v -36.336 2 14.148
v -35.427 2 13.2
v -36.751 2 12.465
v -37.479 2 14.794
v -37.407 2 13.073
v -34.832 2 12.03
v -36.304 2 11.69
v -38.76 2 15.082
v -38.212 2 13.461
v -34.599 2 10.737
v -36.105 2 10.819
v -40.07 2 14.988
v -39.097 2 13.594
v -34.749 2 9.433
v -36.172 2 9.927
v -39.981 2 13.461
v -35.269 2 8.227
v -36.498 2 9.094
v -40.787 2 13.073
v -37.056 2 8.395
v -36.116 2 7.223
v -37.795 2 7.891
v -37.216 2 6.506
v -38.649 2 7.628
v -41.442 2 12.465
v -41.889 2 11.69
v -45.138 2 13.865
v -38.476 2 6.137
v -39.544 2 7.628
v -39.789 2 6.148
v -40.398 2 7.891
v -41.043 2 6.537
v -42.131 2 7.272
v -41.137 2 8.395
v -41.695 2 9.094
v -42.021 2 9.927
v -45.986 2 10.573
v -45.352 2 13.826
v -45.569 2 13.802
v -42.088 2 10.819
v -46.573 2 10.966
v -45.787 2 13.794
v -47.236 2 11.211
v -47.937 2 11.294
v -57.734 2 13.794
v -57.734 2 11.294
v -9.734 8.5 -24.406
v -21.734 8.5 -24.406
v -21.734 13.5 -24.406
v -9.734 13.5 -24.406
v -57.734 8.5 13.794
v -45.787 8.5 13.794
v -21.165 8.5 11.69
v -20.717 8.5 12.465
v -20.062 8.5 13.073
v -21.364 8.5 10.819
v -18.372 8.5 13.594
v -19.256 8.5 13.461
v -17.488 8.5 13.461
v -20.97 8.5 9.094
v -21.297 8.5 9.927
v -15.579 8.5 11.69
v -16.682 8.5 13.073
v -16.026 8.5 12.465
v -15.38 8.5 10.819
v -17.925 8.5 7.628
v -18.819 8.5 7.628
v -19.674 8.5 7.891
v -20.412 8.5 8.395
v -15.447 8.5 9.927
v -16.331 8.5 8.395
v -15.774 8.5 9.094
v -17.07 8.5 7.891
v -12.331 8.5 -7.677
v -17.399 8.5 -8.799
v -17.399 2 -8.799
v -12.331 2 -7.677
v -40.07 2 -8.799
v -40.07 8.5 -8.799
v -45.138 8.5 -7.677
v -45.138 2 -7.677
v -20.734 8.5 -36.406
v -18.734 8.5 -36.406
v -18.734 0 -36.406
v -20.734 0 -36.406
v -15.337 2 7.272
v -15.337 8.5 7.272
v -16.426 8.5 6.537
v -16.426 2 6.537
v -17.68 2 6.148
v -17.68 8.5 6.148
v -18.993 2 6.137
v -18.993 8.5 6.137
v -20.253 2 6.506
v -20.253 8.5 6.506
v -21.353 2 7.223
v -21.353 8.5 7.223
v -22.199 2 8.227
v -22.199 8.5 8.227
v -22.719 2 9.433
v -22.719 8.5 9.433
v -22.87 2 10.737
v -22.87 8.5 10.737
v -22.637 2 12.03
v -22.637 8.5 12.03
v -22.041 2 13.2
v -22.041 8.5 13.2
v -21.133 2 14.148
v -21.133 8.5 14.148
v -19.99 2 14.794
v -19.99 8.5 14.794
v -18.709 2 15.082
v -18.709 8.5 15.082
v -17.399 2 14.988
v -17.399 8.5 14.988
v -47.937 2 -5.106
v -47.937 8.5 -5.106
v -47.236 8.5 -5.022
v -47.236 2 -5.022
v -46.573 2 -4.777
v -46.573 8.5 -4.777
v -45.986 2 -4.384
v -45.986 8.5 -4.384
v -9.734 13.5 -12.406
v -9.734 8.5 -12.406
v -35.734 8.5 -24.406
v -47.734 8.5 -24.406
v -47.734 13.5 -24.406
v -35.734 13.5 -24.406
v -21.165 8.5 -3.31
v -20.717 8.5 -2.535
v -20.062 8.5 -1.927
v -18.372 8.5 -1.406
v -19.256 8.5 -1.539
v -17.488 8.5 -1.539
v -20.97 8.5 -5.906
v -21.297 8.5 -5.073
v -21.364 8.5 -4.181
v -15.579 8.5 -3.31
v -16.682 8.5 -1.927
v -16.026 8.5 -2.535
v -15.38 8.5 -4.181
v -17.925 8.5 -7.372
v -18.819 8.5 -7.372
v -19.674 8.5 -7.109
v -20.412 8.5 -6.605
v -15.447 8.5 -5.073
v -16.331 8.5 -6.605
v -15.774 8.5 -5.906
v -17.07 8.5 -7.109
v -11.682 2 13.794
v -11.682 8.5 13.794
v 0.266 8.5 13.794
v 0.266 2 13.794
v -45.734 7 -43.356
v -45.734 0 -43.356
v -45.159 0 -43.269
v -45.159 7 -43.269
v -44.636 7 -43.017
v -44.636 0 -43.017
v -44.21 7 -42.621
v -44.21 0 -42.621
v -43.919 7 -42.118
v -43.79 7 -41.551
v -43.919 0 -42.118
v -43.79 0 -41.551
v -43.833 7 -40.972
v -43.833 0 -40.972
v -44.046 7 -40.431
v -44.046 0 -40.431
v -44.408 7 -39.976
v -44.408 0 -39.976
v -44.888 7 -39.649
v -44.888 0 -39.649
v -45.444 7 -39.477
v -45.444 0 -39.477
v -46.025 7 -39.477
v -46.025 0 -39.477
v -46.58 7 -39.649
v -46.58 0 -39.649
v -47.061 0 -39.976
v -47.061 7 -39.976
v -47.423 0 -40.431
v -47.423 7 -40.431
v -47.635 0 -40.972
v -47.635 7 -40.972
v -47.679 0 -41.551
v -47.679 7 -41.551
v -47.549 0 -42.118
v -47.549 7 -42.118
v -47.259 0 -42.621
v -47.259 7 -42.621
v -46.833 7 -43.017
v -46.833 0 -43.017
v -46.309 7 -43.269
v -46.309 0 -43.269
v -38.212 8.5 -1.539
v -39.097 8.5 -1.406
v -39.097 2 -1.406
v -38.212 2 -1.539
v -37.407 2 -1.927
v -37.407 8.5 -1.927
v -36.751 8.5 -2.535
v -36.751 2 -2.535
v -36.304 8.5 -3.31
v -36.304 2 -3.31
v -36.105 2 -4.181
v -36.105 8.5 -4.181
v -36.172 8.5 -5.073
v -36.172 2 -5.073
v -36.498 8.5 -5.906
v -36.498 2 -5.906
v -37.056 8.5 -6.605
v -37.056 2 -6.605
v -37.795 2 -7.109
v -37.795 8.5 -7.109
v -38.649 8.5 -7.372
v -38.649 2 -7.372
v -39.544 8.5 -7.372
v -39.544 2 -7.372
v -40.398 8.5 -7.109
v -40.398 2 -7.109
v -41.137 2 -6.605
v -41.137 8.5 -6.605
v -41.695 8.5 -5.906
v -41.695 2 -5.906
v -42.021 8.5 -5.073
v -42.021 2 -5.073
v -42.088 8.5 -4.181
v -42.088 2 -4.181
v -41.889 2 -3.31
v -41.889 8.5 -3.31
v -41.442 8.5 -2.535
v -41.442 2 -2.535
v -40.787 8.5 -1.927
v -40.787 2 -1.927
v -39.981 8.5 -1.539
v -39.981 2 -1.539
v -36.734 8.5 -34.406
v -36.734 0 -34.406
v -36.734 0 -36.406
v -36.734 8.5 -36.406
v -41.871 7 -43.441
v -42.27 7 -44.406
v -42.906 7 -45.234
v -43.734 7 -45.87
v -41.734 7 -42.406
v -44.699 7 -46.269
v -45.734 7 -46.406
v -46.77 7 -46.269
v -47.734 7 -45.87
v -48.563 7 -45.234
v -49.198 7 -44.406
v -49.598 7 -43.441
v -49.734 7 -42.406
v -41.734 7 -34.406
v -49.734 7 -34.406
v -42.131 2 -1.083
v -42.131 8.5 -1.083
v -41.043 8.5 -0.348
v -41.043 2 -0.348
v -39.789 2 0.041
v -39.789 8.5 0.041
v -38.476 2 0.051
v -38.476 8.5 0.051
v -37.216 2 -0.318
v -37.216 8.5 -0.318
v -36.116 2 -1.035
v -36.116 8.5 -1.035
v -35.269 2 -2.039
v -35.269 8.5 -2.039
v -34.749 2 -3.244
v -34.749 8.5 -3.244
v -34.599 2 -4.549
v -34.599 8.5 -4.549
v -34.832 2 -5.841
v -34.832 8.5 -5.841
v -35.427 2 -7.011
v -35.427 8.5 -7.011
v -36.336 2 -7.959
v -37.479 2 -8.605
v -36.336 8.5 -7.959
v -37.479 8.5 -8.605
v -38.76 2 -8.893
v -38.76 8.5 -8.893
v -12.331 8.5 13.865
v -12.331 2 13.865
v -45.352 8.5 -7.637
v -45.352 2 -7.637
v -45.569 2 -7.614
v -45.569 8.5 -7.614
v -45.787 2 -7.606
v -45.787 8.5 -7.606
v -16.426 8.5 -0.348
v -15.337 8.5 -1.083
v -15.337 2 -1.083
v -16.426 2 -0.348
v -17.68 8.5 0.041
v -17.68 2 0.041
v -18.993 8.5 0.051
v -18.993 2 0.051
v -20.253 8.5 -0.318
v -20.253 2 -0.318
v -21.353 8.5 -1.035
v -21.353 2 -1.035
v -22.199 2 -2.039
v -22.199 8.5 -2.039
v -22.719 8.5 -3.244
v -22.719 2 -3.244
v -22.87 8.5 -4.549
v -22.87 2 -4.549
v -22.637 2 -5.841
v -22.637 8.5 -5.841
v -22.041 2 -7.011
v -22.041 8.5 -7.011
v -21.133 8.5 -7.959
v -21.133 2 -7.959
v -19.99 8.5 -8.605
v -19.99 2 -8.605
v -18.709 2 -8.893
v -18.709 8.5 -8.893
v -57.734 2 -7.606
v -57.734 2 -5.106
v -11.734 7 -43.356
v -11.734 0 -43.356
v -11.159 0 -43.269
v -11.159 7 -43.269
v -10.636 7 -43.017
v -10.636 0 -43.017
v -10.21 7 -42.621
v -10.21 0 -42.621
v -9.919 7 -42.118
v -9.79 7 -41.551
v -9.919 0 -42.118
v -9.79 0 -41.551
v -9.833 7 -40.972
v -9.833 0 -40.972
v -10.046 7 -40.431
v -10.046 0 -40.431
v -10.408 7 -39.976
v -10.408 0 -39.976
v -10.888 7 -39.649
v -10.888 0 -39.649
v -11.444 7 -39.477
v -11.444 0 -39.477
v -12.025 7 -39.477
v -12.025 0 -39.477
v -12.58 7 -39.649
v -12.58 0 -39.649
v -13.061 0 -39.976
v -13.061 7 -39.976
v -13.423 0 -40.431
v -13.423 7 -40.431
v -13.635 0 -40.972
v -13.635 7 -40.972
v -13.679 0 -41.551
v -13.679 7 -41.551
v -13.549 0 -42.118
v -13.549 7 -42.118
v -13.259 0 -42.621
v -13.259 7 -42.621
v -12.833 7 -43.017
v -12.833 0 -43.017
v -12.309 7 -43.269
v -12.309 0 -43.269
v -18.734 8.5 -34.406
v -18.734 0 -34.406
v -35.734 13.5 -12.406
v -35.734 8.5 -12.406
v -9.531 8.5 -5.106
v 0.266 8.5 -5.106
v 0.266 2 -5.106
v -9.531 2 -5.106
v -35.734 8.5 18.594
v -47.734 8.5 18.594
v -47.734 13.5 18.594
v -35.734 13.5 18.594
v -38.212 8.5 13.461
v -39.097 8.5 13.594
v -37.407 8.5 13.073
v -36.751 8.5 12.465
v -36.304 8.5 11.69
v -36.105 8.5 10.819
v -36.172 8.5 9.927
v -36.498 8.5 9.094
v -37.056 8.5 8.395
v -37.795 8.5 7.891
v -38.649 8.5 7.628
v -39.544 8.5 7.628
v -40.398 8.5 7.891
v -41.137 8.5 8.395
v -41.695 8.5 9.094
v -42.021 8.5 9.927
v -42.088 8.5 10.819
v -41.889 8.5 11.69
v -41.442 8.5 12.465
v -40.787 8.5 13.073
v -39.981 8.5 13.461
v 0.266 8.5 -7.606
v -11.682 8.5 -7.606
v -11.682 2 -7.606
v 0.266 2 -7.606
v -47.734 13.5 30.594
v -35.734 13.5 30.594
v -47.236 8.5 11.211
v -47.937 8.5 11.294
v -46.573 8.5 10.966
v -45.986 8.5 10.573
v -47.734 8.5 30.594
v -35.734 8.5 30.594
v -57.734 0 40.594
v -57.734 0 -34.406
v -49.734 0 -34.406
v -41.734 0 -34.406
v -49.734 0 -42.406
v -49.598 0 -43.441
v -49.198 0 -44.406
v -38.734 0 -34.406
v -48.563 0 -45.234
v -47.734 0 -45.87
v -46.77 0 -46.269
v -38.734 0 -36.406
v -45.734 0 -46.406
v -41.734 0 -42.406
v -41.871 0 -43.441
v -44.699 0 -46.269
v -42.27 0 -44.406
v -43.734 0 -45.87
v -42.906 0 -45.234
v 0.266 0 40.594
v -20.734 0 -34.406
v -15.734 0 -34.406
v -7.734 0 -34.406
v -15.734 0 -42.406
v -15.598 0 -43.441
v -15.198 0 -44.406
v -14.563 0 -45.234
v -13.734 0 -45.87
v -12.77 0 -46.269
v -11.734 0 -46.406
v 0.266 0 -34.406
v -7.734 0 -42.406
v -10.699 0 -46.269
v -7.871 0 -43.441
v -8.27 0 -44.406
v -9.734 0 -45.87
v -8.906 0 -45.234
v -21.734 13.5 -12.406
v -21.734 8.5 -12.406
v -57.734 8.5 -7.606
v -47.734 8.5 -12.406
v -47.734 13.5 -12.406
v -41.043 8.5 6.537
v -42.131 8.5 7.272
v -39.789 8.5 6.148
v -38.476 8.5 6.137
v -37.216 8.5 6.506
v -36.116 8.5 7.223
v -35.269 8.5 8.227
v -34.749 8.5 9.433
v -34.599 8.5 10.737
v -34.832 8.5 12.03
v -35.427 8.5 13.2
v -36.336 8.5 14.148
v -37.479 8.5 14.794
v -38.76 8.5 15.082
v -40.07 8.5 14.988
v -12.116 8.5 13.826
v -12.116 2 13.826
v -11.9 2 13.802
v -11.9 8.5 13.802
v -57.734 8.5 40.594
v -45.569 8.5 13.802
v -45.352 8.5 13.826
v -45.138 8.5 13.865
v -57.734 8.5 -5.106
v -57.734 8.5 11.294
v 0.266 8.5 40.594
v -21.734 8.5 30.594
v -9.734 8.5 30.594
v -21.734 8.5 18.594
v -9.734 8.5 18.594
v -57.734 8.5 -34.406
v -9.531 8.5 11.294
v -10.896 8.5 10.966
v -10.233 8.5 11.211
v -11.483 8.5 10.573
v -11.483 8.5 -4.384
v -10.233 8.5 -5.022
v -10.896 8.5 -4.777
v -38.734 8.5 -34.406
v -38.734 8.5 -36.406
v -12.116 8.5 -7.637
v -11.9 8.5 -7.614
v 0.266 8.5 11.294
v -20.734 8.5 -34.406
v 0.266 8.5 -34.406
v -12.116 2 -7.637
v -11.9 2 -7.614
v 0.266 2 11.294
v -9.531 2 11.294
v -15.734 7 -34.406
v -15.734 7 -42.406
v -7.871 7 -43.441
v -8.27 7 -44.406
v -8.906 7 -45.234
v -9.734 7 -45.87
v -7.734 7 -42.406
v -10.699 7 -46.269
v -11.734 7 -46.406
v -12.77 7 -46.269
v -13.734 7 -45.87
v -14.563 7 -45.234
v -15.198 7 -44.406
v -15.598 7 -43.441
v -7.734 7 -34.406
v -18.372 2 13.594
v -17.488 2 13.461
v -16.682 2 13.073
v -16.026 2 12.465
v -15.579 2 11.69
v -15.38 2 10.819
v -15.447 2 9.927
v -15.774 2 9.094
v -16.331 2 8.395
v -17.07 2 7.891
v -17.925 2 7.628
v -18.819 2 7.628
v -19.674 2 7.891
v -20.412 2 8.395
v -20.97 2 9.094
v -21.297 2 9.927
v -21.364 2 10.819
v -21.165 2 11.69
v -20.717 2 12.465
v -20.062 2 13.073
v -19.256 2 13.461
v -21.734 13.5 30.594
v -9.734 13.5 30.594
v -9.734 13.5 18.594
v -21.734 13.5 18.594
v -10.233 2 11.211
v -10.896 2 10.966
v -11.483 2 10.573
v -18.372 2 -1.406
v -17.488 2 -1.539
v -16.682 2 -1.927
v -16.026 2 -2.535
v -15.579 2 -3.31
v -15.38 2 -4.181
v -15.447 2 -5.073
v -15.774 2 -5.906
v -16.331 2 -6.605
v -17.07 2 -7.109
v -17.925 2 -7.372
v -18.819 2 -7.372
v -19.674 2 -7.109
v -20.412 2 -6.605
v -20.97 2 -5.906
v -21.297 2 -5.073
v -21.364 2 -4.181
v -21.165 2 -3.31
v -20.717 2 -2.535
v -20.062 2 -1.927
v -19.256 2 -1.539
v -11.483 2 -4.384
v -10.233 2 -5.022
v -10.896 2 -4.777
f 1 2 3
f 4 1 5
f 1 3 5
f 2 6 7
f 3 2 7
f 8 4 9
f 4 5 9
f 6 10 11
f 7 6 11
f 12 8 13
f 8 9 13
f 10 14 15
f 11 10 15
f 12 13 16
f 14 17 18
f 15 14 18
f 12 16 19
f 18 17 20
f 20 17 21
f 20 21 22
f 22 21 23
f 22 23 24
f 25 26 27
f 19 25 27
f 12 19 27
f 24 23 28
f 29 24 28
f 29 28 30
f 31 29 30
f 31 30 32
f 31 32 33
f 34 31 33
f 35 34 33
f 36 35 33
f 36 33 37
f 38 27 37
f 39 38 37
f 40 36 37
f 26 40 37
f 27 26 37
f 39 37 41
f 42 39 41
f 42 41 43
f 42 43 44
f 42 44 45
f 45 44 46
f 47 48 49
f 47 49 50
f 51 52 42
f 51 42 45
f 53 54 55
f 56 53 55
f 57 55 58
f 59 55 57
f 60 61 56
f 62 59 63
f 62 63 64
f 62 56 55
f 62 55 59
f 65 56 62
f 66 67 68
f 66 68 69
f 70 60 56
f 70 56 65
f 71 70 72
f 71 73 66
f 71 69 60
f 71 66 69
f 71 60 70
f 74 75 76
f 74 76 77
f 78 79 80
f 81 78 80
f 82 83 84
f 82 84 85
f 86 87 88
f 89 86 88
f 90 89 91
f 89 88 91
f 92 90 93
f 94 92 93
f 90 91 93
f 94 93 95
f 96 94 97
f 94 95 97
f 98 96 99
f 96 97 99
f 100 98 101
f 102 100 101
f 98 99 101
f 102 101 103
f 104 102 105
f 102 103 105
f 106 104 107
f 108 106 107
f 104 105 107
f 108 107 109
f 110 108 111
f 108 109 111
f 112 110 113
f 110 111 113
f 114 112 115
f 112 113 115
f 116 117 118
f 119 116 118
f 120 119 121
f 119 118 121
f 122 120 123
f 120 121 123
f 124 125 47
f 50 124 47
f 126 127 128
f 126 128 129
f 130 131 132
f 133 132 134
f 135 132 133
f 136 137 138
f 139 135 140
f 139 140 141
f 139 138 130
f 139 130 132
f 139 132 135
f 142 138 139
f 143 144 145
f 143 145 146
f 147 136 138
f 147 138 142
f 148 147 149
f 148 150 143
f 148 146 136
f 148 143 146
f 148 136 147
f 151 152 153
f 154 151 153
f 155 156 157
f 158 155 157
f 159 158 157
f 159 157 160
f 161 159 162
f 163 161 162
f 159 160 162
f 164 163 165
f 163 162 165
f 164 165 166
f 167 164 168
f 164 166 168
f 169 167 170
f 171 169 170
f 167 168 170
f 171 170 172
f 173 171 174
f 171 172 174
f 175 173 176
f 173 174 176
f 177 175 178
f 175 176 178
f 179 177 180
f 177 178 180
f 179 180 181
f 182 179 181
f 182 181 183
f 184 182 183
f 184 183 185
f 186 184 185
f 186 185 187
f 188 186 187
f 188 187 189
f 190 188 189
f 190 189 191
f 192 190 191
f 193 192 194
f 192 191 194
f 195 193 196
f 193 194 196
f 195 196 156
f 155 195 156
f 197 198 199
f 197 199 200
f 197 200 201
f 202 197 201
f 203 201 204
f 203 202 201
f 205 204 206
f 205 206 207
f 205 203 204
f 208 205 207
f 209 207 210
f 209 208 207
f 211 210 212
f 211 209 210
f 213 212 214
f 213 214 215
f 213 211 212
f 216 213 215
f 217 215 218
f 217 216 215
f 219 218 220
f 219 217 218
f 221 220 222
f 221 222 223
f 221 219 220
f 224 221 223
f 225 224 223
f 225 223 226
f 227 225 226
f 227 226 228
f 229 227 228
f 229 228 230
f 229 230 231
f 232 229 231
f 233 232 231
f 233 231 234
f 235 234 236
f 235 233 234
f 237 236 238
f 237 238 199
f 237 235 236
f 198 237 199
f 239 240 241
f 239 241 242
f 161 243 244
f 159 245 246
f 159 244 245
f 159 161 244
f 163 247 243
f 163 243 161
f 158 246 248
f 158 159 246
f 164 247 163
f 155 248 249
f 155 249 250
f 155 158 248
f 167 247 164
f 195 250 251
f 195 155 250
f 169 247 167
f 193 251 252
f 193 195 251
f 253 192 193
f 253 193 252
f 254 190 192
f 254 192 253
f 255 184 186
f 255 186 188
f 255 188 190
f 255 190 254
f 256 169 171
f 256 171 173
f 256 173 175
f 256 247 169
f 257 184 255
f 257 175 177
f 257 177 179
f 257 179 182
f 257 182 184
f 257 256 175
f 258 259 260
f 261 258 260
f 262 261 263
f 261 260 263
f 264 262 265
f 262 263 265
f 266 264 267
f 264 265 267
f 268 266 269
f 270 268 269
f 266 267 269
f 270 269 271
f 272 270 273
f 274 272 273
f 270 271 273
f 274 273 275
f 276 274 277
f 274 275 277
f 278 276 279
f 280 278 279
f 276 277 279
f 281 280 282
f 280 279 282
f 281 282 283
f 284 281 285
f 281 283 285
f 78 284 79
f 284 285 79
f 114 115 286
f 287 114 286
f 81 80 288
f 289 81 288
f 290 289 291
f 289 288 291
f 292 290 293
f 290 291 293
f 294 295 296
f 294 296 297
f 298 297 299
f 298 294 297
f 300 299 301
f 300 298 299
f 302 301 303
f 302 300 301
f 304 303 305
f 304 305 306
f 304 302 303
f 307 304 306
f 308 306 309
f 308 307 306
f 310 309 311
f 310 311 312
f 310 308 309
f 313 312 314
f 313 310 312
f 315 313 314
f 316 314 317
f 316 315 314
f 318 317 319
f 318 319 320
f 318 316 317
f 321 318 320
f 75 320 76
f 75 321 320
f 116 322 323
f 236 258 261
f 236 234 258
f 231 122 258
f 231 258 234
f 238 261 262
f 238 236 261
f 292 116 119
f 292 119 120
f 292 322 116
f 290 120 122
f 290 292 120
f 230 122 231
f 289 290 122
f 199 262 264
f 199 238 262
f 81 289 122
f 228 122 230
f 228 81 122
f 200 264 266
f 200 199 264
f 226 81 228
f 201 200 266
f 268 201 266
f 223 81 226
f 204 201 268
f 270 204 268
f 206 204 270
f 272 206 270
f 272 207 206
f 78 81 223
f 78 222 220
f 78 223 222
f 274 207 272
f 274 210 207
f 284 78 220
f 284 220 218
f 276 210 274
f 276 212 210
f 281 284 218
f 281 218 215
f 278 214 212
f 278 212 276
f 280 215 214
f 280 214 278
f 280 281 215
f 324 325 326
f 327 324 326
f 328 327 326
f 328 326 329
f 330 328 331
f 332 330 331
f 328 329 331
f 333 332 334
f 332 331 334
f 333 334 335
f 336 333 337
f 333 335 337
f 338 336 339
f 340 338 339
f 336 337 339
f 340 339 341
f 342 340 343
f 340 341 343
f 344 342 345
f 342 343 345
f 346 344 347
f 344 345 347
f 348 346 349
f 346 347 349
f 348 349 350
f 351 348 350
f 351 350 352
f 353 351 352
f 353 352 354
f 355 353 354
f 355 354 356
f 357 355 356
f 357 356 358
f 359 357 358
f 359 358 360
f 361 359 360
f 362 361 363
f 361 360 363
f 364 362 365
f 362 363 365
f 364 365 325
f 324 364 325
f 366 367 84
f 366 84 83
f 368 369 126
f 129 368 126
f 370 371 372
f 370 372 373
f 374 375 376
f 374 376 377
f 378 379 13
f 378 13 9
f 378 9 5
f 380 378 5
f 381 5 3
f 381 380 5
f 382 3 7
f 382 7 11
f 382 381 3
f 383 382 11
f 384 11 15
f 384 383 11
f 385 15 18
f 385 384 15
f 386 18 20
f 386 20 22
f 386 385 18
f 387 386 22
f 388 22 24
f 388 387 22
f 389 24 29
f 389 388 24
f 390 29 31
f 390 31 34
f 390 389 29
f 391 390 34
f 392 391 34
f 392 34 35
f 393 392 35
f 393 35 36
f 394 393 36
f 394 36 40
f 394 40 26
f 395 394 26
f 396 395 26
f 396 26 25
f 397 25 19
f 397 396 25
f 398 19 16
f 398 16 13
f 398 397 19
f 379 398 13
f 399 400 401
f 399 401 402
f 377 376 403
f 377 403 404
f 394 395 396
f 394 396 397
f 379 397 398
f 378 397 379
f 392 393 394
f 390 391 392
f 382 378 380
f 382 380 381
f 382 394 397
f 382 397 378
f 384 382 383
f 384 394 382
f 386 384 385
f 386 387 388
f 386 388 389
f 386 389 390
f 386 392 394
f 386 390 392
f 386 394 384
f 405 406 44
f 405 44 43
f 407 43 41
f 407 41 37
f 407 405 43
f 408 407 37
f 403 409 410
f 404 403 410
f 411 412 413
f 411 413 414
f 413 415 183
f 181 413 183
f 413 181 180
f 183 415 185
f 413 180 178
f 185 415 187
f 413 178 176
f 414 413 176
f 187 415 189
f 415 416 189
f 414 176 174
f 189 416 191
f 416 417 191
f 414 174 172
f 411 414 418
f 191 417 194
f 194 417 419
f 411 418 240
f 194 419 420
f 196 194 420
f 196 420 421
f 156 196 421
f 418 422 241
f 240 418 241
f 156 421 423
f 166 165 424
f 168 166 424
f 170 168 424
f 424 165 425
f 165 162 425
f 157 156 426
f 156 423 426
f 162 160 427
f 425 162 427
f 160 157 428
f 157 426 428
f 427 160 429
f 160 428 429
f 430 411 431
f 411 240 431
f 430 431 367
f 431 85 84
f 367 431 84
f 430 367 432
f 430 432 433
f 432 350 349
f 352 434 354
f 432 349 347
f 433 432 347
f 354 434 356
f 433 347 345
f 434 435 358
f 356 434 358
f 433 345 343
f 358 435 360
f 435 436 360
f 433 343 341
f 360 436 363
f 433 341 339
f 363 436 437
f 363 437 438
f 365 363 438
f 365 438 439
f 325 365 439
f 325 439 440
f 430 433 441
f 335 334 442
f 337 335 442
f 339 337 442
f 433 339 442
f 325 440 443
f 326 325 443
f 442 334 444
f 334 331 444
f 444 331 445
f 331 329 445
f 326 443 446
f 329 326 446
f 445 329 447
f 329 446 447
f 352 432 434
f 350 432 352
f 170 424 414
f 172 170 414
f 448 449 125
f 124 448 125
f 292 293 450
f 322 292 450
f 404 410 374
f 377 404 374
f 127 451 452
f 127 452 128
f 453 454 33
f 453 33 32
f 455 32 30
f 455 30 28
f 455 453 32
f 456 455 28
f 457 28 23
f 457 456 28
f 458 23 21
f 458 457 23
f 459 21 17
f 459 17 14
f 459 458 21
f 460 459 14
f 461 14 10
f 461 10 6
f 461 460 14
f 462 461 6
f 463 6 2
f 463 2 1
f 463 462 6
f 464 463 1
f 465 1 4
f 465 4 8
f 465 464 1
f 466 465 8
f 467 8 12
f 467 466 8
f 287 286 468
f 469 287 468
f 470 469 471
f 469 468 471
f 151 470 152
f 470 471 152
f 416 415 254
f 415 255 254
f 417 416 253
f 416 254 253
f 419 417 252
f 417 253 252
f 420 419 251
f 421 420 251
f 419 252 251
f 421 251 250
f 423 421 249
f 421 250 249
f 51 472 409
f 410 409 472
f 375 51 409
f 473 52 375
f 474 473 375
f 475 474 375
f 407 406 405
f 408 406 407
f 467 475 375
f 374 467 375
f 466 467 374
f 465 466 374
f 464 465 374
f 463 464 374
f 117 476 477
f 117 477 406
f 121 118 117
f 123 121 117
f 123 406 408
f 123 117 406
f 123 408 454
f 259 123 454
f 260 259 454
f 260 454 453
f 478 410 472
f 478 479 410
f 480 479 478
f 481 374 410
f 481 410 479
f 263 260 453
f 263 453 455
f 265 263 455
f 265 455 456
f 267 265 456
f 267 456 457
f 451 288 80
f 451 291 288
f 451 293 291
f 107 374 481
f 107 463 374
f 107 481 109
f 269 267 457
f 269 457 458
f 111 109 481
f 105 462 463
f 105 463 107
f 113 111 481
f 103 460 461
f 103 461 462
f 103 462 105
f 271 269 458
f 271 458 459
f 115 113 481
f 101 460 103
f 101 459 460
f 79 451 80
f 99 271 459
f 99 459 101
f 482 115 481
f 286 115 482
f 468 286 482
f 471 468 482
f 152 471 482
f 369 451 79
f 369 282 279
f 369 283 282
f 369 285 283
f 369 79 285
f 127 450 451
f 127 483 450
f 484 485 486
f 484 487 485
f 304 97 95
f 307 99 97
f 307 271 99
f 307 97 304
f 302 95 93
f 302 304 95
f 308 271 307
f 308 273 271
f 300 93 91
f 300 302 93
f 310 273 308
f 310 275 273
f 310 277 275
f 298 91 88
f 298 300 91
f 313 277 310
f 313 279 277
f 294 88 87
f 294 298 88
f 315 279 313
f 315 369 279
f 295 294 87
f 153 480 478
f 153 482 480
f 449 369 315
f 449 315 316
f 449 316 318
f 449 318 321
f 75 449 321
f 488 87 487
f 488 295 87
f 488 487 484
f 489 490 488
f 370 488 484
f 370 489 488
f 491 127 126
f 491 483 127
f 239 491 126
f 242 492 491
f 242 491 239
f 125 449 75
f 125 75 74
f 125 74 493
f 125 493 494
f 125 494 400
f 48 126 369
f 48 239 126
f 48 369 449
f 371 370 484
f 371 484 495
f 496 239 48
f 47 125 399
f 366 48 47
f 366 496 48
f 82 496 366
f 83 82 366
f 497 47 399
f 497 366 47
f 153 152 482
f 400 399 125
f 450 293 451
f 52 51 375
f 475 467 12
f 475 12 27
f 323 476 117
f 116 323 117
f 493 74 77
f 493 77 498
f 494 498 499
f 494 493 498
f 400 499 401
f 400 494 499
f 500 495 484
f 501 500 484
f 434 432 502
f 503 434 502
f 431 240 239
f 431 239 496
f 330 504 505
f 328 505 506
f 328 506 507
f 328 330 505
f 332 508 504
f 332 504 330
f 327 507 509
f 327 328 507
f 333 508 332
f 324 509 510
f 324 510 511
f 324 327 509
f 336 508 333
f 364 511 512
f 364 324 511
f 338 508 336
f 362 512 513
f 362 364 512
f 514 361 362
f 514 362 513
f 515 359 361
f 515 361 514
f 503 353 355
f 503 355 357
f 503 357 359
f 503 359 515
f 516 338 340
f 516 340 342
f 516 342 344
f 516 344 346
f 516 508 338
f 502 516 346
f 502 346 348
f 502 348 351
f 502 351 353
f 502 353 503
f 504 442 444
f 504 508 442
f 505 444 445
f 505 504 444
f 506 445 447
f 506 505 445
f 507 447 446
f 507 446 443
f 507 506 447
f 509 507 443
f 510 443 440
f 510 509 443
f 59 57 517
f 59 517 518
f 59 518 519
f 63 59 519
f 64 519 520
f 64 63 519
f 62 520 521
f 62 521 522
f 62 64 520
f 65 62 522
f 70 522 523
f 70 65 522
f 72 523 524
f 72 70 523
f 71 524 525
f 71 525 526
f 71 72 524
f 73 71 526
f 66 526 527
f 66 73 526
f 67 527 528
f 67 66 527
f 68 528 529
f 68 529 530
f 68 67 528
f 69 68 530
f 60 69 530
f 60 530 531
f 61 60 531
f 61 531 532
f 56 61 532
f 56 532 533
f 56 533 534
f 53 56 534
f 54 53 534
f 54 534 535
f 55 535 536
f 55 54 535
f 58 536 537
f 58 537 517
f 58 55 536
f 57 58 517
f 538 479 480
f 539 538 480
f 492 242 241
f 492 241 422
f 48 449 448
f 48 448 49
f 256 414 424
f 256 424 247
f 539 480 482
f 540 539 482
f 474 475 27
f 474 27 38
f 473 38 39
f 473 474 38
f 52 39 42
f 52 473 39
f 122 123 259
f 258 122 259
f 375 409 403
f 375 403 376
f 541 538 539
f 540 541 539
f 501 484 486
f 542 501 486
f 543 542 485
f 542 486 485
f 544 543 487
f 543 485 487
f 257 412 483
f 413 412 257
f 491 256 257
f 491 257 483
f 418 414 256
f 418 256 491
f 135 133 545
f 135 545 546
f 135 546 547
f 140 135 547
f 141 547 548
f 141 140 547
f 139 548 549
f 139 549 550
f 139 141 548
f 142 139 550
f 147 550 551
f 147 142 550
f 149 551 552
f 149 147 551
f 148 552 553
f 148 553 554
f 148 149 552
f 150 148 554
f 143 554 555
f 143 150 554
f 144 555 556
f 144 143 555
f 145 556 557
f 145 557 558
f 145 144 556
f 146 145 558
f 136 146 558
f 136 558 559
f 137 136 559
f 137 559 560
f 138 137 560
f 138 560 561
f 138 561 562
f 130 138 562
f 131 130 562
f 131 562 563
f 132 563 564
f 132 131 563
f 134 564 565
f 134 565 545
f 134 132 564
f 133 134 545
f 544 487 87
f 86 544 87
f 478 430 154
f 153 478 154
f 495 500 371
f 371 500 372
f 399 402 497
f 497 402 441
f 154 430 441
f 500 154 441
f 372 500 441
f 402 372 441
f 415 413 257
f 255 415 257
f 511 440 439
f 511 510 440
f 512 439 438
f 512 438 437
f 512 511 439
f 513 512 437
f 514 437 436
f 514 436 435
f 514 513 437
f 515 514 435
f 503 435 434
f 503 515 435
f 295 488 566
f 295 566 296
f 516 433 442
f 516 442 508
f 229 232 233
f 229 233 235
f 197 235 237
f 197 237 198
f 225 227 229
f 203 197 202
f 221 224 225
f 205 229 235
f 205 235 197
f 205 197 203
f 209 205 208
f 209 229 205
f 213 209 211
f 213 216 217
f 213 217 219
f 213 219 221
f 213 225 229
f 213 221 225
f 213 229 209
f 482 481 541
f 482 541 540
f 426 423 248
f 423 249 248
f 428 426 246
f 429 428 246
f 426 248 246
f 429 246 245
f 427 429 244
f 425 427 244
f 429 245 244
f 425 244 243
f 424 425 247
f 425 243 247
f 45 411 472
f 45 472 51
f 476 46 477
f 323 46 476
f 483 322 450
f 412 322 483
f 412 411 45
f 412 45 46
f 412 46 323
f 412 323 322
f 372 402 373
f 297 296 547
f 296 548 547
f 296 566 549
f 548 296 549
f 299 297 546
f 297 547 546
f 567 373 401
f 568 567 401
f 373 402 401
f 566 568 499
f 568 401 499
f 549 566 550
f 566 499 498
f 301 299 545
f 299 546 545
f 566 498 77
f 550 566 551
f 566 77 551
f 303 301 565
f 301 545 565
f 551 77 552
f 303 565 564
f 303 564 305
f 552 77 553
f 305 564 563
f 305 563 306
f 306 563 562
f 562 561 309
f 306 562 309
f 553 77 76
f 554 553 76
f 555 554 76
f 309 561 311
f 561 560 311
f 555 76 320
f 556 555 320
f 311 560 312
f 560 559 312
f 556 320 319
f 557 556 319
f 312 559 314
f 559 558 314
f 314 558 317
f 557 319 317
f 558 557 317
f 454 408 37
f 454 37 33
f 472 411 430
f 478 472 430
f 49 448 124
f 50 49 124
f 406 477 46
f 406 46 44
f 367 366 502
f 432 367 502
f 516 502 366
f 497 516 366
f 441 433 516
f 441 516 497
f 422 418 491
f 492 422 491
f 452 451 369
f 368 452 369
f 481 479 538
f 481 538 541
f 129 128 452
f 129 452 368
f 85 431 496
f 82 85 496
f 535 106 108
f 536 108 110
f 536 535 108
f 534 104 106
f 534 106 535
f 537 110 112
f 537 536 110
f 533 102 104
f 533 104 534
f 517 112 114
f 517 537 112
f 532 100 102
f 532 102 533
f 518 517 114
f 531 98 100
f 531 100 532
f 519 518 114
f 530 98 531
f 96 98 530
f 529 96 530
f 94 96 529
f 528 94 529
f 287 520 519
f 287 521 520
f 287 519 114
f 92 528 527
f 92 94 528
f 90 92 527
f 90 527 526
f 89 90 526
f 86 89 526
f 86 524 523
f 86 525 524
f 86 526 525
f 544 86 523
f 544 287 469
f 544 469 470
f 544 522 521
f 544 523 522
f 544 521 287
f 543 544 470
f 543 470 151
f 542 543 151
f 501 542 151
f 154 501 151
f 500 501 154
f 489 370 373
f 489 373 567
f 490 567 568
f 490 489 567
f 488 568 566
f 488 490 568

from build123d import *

# Parameters (mm, degrees)
SKETCH1_W           = 58
SKETCH1_H           = 75
BOSS_EXTRUDE1_DEPTH = 8.5
SKETCH4_R           = 3
CUT_EXTRUDE1_DEPTH  = 6.5
SKETCH5_W           = 12
SKETCH5_H           = 12
BOSS_EXTRUDE2_DEPTH = 5
SKETCH8_W           = 2
SKETCH8_H           = 8.5
BOSS_EXTRUDE3_DEPTH = 2
SKETCH7_W           = 8
SKETCH7_H           = 7
BOSS_EXTRUDE4_DEPTH = 12
SKETCH9_R           = 1.95
CUT_EXTRUDE2_DEPTH  = 7
FILLET1_R           = 4


with BuildPart() as part:
    # Sketch1 → Boss-Extrude1 (new body)
    with BuildSketch(Plane(origin=(0, 0, 0), x_dir=(1, 0, 0), z_dir=(0, 1, 0))):
        with Locations((-28.734265734, -3.094405594)):
            Rectangle(SKETCH1_W, SKETCH1_H)
    extrude(amount=BOSS_EXTRUDE1_DEPTH)

    # Sketch4 → Cut-Extrude1 (cut)
    # profile 1 of 4: a face of its own
    with BuildSketch(Plane(origin=(0, 8.5, 0), x_dir=(1, 0, 0), z_dir=(0, 1, 0))):
        with BuildLine():
            Line((-57.734265734, 7.605594406), (-57.734265734, 5.105594406))
            Line((-57.734265734, 5.105594406), (-47.937319909, 5.105594406))
            ThreePointArc((-47.937319909, 5.105594406), (-46.897035131, 4.919454313), (-45.985842823, 4.384132793))
            Line((-45.985842823, 4.384132793), (-42.13114507, 1.082738189))
            ThreePointArc((-42.13114507, 1.082738189), (-34.749045592, 3.244128144), (-40.069670138, 8.799121725))
            Line((-40.069670138, 8.799121725), (-45.137956932, 7.676576192))
            ThreePointArc((-45.137956932, 7.676576192), (-45.46038672, 7.623392649), (-45.786688237, 7.605594406))
            Line((-45.786688237, 7.605594406), (-57.734265734, 7.605594406))
        make_face()
        with Locations(Location((-39.096573179, 4.405594406, 0), (0, 0, 270))):
            Circle(SKETCH4_R, mode=Mode.SUBTRACT)
    # profile 2 of 4: a face of its own
    with BuildSketch(Plane(origin=(0, 8.5, 0), x_dir=(1, 0, 0), z_dir=(0, 1, 0))):
        with BuildLine():
            Line((-57.734265734, -13.794405594), (-57.734265734, -11.294405594))
            Line((-57.734265734, -11.294405594), (-47.937319909, -11.294405594))
            ThreePointArc((-47.937319909, -11.294405594), (-46.897035131, -11.108265502), (-45.985842823, -10.572943982))
            Line((-45.985842823, -10.572943982), (-42.13114507, -7.271549377))
            ThreePointArc((-42.13114507, -7.271549377), (-34.749045592, -9.432939333), (-40.069670138, -14.987932914))
            Line((-40.069670138, -14.987932914), (-45.137956932, -13.865387381))
            ThreePointArc((-45.137956932, -13.865387381), (-45.46038672, -13.812203837), (-45.786688237, -13.794405594))
            Line((-45.786688237, -13.794405594), (-57.734265734, -13.794405594))
        make_face()
        with Locations(Location((-39.096573179, -10.594405594, 0), (0, 0, 270))):
            Circle(SKETCH4_R, mode=Mode.SUBTRACT)
    # profile 3 of 4: a face of its own
    with BuildSketch(Plane(origin=(0, 8.5, 0), x_dir=(1, 0, 0), z_dir=(0, 1, 0))):
        with BuildLine():
            Line((0.265734266, -13.794405594), (0.265734266, -11.294405594))
            Line((0.265734266, -11.294405594), (-9.531211559, -11.294405594))
            ThreePointArc((-9.531211559, -11.294405594), (-10.571496337, -11.108265502), (-11.482688645, -10.572943982))
            Line((-11.482688645, -10.572943982), (-15.337386398, -7.271549377))
            ThreePointArc((-15.337386398, -7.271549377), (-22.719485877, -9.432939333), (-17.39886133, -14.987932914))
            Line((-17.39886133, -14.987932914), (-12.330574537, -13.865387381))
            ThreePointArc((-12.330574537, -13.865387381), (-12.008144749, -13.812203837), (-11.681843231, -13.794405594))
            Line((-11.681843231, -13.794405594), (0.265734266, -13.794405594))
        make_face()
        with Locations(Location((-18.371958289, -10.594405594, 0), (0, 0, 270))):
            Circle(SKETCH4_R, mode=Mode.SUBTRACT)
    # profile 4 of 4: a face of its own
    with BuildSketch(Plane(origin=(0, 8.5, 0), x_dir=(1, 0, 0), z_dir=(0, 1, 0))):
        with BuildLine():
            Line((0.265734266, 7.605594406), (0.265734266, 5.105594406))
            Line((0.265734266, 5.105594406), (-9.531211559, 5.105594406))
            ThreePointArc((-9.531211559, 5.105594406), (-10.571496337, 4.919454313), (-11.482688645, 4.384132793))
            Line((-11.482688645, 4.384132793), (-15.337386398, 1.082738189))
            ThreePointArc((-15.337386398, 1.082738189), (-22.719485877, 3.244128144), (-17.39886133, 8.799121725))
            Line((-17.39886133, 8.799121725), (-12.330574537, 7.676576192))
            ThreePointArc((-12.330574537, 7.676576192), (-12.008144749, 7.623392649), (-11.681843231, 7.605594406))
            Line((-11.681843231, 7.605594406), (0.265734266, 7.605594406))
        make_face()
        with Locations(Location((-18.371958289, 4.405594406, 0), (0, 0, 270))):
            Circle(SKETCH4_R, mode=Mode.SUBTRACT)
    extrude(amount=-CUT_EXTRUDE1_DEPTH, mode=Mode.SUBTRACT)

    # Sketch5 → Boss-Extrude2 (add)
    with BuildSketch(Plane(origin=(0, 8.5, 0), x_dir=(1, 0, 0), z_dir=(0, 1, 0))):
        with Locations((-41.734265734, 18.405594406)):
            Rectangle(SKETCH5_W, SKETCH5_H)
        with Locations((-15.734265734, 18.405594406)):
            Rectangle(SKETCH5_W, SKETCH5_H)
        with Locations((-15.734265734, -24.594405594)):
            Rectangle(SKETCH5_W, SKETCH5_H)
        with Locations((-41.734265734, -24.594405594)):
            Rectangle(SKETCH5_W, SKETCH5_H)
    extrude(amount=BOSS_EXTRUDE2_DEPTH)

    # Sketch8 → Boss-Extrude3 (add)
    with BuildSketch(Plane(origin=(0, 0, -34.405594406), x_dir=(-1, 0, 0), z_dir=(0, 0, -1))):
        with Locations((37.734265734, 4.25)):
            Rectangle(SKETCH8_W, SKETCH8_H)
        with Locations((19.734265734, 4.25)):
            Rectangle(SKETCH8_W, SKETCH8_H)
    extrude(amount=BOSS_EXTRUDE3_DEPTH)

    # Sketch7 → Boss-Extrude4 (add)
    with BuildSketch(Plane(origin=(0, 0, -34.405594406), x_dir=(-1, 0, 0), z_dir=(0, 0, -1))):
        with Locations((45.734265734, 3.5)):
            Rectangle(SKETCH7_W, SKETCH7_H)
        with Locations((11.734265734, 3.5)):
            Rectangle(SKETCH7_W, SKETCH7_H)
    extrude(amount=BOSS_EXTRUDE4_DEPTH)

    # Sketch9 → Cut-Extrude2 (cut)
    with BuildSketch(Plane(origin=(0, 0, 0), x_dir=(-1, 0, 0), z_dir=(0, -1, 0))):
        with Locations(Location((11.734265734, 41.405594406, 0), (0, 0, 90))):
            Circle(SKETCH9_R)
        with Locations(Location((45.734265734, 41.405594406, 0), (0, 0, 90))):
            Circle(SKETCH9_R)
    extrude(amount=-CUT_EXTRUDE2_DEPTH, mode=Mode.SUBTRACT)

    # Fillet1
    fillet1_edges = [part.edges().sort_by_distance(p)[0] for p in [
        (-7.734265734, 3.5, -46.405594406),
        (-15.734265734, 3.5, -46.405594406),
        (-49.734265734, 3.5, -46.405594406),
        (-41.734265734, 3.5, -46.405594406),
    ]]
    fillet(fillet1_edges, radius=FILLET1_R - 0.0001)  # a hair under: the kernel refuses the full size


solid = part.part
